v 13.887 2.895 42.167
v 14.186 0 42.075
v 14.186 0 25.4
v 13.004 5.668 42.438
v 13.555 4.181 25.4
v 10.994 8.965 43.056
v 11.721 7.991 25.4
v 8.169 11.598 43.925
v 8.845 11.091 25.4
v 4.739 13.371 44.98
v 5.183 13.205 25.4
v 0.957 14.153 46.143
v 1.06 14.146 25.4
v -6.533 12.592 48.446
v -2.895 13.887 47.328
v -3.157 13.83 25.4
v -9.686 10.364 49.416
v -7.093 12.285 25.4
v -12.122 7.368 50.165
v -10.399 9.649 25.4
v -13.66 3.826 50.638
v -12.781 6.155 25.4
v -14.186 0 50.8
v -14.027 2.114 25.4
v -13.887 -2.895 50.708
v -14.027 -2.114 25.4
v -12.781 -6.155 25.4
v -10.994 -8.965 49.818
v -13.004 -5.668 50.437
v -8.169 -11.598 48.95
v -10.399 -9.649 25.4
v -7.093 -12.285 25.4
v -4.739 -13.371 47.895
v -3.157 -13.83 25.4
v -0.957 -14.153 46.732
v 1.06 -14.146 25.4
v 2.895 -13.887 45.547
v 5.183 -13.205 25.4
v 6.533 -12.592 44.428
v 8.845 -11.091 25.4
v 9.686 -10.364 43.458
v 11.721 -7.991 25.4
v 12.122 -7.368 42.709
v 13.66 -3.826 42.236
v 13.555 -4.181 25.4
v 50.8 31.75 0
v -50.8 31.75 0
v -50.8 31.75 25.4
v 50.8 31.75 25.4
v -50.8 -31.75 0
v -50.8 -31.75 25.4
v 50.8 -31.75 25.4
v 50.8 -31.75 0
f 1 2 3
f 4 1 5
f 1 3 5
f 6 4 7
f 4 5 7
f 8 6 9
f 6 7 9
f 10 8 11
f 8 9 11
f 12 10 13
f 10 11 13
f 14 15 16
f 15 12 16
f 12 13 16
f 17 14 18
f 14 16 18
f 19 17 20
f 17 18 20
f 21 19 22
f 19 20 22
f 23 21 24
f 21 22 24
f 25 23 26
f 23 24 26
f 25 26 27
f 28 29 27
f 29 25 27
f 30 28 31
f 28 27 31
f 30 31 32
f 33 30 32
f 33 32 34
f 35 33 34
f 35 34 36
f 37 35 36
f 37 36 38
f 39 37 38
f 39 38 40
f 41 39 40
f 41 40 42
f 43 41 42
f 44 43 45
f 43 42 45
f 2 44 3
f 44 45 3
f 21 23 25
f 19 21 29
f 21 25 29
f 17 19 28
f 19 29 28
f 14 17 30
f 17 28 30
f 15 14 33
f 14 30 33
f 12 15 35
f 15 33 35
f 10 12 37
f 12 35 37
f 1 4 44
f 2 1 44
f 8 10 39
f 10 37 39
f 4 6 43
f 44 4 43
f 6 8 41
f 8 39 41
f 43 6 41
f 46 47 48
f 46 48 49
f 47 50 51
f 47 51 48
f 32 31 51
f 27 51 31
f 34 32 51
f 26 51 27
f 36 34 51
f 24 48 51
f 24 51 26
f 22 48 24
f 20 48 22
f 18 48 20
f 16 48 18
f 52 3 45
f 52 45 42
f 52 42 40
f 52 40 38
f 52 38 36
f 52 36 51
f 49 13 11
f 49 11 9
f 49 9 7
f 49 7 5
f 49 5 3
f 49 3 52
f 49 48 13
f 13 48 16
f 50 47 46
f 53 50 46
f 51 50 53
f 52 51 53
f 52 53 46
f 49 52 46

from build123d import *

# Parameters (mm, degrees)
F0_W     = 101.6
F0_H     = 63.5
F2_DEPTH = 25.4
F1_R     = 14.185662
F3_DEPTH = 50.8
F5_DEPTH = 25.4


with BuildPart() as f2:
    # F0 (on Top) → F2 (new body)
    with BuildSketch(Plane.XY):
        Rectangle(F0_W, F0_H)
    extrude(amount=F2_DEPTH)

    # F1 (on face) → F3 (join)
    with BuildSketch(Plane.XY):
        Circle(F1_R)
    extrude(amount=F3_DEPTH)

    # F4 (on Front) → F5 (cut, symmetric)
    with BuildSketch(Plane.XZ):
        Polygon((14.185662, 50.8), (-14.185662, 50.8), (14.185662, 42.07477), align=None)
    extrude(amount=F5_DEPTH, both=True, mode=Mode.SUBTRACT)


solid = f2.part
